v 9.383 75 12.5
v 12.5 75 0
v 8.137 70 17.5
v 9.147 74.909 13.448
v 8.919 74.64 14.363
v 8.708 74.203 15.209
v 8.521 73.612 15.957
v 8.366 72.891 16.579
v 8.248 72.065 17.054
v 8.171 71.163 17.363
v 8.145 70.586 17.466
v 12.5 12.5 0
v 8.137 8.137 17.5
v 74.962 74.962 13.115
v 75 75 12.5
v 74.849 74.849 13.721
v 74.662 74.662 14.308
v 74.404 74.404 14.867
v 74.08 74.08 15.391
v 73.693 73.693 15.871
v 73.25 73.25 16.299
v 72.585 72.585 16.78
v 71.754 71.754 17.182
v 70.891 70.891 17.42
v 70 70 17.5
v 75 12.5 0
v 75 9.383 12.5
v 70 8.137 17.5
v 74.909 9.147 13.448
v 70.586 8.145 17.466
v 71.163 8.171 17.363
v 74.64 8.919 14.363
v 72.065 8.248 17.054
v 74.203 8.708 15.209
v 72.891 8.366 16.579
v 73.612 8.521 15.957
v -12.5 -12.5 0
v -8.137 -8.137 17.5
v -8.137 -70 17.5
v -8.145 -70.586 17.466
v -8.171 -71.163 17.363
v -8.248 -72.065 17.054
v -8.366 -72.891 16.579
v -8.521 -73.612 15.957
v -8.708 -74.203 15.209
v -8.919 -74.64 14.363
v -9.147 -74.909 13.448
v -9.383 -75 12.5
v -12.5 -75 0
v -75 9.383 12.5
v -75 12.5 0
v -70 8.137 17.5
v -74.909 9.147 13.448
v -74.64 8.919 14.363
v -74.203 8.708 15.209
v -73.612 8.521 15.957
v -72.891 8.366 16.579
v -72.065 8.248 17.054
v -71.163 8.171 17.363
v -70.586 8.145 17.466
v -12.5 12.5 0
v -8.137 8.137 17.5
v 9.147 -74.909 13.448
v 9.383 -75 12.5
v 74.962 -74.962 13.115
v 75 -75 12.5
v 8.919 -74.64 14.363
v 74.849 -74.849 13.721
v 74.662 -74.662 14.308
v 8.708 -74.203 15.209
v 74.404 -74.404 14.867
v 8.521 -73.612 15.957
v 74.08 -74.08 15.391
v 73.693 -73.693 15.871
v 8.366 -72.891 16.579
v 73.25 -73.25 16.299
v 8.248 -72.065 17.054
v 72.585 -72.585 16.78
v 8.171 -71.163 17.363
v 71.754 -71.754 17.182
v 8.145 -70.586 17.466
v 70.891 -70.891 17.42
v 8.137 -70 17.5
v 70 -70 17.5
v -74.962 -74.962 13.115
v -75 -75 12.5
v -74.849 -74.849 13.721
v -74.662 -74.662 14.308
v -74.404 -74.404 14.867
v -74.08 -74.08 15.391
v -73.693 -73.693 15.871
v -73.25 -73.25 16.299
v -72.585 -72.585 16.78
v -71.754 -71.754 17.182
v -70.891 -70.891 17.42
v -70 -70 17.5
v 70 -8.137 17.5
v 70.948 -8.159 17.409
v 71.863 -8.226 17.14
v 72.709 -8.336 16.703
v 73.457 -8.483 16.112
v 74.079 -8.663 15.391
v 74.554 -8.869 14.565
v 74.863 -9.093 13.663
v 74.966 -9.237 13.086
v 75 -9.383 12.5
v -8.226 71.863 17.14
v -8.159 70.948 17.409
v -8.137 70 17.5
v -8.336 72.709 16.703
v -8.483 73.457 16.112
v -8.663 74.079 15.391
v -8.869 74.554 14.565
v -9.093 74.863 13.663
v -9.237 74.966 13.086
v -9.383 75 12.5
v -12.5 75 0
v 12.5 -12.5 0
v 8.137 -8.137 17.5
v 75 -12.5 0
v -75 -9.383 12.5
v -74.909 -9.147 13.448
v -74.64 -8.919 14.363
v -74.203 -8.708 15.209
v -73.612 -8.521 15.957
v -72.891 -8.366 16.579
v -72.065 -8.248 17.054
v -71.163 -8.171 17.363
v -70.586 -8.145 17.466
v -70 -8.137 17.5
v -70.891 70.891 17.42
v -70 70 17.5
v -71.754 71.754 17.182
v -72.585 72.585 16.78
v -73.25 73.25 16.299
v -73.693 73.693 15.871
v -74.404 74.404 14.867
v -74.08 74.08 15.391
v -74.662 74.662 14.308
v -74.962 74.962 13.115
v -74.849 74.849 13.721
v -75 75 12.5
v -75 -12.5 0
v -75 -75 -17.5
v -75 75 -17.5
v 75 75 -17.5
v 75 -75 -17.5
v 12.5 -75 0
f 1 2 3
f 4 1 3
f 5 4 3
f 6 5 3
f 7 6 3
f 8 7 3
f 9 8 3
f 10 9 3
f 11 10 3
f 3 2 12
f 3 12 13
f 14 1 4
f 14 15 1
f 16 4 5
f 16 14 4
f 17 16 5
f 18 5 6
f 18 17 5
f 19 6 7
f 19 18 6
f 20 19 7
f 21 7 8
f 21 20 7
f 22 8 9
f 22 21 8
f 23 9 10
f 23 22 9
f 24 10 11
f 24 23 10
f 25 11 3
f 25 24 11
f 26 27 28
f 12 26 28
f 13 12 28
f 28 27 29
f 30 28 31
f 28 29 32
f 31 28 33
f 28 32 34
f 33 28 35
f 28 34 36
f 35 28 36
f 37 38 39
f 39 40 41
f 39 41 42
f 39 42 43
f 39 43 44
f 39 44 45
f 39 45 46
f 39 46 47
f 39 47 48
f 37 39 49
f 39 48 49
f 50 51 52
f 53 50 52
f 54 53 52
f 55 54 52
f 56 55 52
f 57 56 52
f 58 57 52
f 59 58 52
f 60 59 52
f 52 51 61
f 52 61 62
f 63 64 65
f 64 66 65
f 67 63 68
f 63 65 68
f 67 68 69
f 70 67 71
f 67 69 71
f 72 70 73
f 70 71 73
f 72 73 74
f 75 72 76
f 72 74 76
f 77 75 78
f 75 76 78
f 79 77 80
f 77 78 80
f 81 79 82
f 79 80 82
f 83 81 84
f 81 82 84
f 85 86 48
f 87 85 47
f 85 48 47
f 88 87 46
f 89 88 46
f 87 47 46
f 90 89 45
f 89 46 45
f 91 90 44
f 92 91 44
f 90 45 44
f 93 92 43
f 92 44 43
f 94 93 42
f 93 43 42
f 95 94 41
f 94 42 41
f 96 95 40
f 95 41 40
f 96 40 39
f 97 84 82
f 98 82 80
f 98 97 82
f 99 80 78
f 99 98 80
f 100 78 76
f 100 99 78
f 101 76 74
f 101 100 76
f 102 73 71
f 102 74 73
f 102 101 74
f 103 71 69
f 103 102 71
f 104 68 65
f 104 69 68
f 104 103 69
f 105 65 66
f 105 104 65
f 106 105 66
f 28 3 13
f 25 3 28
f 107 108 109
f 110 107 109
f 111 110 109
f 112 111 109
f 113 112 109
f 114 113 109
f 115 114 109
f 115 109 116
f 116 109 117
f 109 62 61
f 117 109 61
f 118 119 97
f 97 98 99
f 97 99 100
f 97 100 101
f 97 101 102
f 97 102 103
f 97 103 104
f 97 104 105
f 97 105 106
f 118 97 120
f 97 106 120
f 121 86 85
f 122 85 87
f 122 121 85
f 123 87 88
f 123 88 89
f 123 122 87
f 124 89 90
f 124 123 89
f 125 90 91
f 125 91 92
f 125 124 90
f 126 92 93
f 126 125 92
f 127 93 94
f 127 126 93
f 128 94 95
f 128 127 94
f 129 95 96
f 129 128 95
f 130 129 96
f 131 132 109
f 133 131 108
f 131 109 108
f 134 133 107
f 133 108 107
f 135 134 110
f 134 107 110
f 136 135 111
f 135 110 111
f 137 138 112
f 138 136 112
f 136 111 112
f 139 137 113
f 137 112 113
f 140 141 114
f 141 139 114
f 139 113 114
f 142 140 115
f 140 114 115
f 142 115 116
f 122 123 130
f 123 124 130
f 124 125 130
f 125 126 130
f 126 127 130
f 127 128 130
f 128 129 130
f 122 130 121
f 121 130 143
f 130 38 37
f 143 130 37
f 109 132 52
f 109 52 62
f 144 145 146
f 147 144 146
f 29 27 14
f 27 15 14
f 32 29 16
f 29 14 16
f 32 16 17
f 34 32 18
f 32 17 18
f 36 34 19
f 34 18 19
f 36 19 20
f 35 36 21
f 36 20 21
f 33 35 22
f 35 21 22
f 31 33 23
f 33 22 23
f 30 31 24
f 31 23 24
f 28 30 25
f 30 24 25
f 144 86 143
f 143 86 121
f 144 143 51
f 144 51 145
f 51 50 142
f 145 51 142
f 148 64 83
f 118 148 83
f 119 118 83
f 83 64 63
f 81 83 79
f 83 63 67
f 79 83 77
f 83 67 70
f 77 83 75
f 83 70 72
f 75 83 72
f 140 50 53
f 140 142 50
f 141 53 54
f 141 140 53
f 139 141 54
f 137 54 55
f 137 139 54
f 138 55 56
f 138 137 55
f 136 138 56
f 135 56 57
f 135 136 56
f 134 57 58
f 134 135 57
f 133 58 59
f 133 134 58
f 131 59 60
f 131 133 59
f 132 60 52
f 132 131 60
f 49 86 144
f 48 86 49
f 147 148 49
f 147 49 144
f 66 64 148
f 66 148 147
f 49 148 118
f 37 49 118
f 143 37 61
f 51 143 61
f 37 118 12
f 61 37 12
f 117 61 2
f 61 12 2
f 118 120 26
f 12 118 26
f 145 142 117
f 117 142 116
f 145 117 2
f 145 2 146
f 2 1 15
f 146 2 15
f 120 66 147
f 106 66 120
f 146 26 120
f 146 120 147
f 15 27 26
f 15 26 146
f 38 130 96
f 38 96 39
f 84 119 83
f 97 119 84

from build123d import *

# Parameters (mm, degrees)
F0_W     = 150
F0_H     = 150
F1_DEPTH = 17.5
F3_DEPTH = 150.001
F5_DEPTH = 150.001
F6_R     = 5


with BuildPart() as f1:
    # F0 (on Top) → F1 (new body, symmetric)
    with BuildSketch(Plane.XY):
        Rectangle(F0_W, F0_H)
    extrude(amount=F1_DEPTH, both=True)

    # F2 (on face) → F3 (cut, through all)
    with BuildSketch(Plane.XZ.offset(75)):
        Polygon((-8.13676, 17.5), (-12.5, 0), (12.5, 0), (8.13676, 17.5), align=None)
    extrude(amount=-F3_DEPTH, mode=Mode.SUBTRACT)

    # F4 (on face) → F5 (cut, through all)
    with BuildSketch(Plane.YZ.offset(75)):
        Polygon((-8.13676, 17.5), (-12.5, 0), (12.5, 0), (8.13676, 17.5), align=None)
    extrude(amount=-F5_DEPTH, mode=Mode.SUBTRACT)

    # F6
    f6_edges = [f1.edges().sort_by_distance(p)[0] for p in [
        (-75, 41.56838, 17.5),
        (-75, -41.56838, 17.5),
        (-41.56838, -75, 17.5),
        (41.56838, -75, 17.5),
        (75, -41.56838, 17.5),
        (75, 41.56838, 17.5),
        (41.56838, 75, 17.5),
        (-41.56838, 75, 17.5),
    ]]
    fillet(f6_edges, radius=F6_R)


solid = f1.part
